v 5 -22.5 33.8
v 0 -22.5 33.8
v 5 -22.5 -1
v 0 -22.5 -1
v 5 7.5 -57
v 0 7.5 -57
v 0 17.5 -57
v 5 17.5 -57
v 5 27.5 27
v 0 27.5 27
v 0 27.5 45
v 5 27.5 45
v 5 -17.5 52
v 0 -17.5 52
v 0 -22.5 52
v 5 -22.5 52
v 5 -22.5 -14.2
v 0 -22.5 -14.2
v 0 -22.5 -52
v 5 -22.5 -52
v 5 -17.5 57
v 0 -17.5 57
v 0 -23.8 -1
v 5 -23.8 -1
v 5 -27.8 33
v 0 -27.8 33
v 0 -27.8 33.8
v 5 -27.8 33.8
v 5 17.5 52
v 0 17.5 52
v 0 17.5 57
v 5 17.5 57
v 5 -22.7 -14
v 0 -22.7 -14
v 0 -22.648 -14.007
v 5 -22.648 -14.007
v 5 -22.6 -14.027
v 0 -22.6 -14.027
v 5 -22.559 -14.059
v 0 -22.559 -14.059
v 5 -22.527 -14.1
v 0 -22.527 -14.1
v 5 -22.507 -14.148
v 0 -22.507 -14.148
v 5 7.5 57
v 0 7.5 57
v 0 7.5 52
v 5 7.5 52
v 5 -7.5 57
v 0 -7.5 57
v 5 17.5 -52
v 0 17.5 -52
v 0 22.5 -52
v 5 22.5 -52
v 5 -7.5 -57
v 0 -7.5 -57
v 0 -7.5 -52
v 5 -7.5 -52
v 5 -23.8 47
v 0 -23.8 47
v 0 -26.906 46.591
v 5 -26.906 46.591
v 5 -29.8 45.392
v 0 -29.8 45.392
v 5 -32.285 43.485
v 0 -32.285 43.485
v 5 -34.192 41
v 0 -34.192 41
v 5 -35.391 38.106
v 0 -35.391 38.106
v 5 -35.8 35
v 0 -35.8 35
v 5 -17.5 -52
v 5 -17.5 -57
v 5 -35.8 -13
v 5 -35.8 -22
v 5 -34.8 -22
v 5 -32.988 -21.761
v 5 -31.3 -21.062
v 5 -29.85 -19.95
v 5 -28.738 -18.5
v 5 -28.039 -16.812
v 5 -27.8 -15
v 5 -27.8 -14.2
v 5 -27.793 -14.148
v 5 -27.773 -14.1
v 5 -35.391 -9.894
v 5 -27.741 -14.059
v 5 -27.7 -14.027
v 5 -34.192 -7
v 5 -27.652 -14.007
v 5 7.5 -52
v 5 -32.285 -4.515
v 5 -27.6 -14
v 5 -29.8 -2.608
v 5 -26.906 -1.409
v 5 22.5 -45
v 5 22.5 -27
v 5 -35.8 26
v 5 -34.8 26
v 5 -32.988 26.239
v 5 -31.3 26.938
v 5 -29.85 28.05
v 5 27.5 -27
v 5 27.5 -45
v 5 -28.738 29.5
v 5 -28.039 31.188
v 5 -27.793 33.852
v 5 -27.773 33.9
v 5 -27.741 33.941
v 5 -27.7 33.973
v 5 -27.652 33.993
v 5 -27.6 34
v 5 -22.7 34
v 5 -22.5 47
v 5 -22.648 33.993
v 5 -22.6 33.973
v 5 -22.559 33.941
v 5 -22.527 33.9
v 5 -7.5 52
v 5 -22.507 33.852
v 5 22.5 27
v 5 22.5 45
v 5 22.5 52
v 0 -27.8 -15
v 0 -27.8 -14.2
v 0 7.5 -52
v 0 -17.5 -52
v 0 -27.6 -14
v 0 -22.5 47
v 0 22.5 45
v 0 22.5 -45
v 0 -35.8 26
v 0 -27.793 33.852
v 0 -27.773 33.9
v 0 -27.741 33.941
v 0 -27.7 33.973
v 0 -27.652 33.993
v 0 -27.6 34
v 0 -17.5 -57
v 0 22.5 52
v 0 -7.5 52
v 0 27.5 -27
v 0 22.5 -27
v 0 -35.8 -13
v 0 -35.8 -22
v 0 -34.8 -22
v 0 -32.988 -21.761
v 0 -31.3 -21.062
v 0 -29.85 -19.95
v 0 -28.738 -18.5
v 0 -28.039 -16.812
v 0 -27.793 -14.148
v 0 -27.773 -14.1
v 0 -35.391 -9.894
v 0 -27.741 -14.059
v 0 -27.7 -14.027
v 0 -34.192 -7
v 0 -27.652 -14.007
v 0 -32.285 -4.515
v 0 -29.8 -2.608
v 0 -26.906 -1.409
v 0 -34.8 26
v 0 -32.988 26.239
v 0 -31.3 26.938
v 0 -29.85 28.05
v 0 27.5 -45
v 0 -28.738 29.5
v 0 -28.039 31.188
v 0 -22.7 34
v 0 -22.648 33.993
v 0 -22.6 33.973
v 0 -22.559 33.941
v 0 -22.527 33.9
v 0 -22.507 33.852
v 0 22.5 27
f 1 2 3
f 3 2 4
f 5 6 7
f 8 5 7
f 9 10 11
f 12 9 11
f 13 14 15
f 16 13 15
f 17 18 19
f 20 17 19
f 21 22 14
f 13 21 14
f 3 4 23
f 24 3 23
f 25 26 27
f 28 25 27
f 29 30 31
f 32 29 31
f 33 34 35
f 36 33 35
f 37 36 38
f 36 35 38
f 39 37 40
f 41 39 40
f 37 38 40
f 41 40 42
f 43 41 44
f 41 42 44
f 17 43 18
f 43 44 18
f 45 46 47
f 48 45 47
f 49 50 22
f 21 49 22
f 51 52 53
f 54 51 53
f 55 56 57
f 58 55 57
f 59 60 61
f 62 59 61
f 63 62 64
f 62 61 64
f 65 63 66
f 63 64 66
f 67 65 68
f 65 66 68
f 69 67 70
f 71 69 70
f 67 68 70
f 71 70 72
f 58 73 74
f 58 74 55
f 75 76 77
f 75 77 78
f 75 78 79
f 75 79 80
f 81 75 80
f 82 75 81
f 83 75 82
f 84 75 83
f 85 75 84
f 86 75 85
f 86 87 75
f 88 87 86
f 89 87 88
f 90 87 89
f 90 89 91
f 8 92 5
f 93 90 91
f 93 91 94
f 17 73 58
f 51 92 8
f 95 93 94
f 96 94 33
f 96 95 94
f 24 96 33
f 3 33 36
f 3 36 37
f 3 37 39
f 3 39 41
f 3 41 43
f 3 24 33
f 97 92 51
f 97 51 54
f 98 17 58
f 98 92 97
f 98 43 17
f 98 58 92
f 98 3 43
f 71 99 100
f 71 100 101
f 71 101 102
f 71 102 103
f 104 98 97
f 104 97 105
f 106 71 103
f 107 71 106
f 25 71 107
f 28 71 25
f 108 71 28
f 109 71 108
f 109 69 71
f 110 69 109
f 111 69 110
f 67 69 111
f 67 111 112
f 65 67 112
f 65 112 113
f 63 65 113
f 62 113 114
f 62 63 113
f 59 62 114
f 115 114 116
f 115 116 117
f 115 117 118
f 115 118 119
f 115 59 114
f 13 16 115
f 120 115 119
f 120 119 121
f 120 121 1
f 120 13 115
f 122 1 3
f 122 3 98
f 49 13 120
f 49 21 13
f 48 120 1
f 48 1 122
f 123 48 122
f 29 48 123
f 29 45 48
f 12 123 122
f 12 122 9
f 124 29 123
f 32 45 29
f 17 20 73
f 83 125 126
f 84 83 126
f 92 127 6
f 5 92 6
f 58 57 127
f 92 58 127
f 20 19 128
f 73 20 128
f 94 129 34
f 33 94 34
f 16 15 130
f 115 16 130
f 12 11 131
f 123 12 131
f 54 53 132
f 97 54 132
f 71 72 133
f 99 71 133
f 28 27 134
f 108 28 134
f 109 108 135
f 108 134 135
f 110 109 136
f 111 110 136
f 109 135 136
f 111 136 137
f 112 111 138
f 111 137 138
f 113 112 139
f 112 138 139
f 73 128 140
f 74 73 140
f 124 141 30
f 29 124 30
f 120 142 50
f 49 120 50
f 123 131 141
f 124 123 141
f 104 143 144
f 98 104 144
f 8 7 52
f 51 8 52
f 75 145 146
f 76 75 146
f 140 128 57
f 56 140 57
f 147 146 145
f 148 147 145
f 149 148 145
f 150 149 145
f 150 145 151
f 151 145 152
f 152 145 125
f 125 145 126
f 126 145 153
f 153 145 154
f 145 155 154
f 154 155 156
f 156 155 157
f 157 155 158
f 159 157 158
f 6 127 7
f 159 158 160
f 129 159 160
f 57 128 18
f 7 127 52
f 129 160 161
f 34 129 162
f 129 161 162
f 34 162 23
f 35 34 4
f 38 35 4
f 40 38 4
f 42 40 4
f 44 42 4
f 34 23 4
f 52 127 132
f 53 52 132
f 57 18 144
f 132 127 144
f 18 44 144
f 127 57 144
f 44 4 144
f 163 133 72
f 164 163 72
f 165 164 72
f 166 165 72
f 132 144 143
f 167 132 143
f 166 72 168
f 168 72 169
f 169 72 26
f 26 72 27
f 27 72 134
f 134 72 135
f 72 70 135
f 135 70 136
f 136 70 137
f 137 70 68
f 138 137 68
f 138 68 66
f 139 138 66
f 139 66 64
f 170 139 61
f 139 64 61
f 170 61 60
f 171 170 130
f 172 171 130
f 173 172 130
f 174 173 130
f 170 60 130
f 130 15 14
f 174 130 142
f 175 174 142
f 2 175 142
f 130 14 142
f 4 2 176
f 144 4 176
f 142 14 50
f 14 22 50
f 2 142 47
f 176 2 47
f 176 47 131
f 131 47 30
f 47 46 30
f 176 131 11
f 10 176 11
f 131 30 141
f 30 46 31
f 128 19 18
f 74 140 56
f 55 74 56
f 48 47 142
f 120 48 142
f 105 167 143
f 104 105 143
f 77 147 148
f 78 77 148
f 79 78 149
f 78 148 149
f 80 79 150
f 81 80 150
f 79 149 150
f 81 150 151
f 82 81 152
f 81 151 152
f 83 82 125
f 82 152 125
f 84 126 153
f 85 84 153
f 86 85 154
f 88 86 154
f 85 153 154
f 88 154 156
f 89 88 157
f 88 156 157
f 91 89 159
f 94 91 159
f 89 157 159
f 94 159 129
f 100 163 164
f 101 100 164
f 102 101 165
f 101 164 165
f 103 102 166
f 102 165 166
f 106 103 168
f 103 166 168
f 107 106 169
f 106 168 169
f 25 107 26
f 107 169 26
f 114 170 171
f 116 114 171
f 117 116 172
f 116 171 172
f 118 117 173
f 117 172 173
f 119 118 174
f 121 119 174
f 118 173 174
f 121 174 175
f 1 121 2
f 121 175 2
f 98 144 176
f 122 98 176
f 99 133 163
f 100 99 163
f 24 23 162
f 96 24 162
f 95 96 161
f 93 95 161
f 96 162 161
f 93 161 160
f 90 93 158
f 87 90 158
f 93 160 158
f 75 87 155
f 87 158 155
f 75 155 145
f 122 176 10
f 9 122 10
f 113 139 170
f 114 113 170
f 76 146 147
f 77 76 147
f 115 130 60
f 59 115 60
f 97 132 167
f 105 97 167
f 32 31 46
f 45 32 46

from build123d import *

# Parameters (mm, degrees)
F1_DEPTH = 5


with BuildPart() as f1:
    # F0 (on Right) → F1 (new body)
    with BuildSketch(Plane.YZ):
        with BuildLine():
            Line((-17.5, 52), (-22.5, 52))
            Line((-22.5, 52), (-22.5, 47))
            Line((-22.5, 47), (-23.8, 47))
            ThreePointArc((-23.8, 47), (-32.285281, 43.485281), (-35.8, 35))
            Line((-35.8, 35), (-35.8, 26))
            Line((-35.8, 26), (-34.8, 26))
            ThreePointArc((-34.8, 26), (-29.850253, 28.050253), (-27.8, 33))
            Line((-27.8, 33), (-27.8, 33.8))
            ThreePointArc((-27.8, 33.8), (-27.741421, 33.941421), (-27.6, 34))
            Line((-27.6, 34), (-22.7, 34))
            ThreePointArc((-22.7, 34), (-22.558579, 33.941421), (-22.5, 33.8))
            Line((-22.5, 33.8), (-22.5, -1))
            Line((-22.5, -1), (-23.8, -1))
            ThreePointArc((-23.8, -1), (-32.285281, -4.514719), (-35.8, -13))
            Line((-35.8, -13), (-35.8, -22))
            Line((-35.8, -22), (-34.8, -22))
            ThreePointArc((-34.8, -22), (-29.850253, -19.949747), (-27.8, -15))
            Line((-27.8, -15), (-27.8, -14.2))
            ThreePointArc((-27.8, -14.2), (-27.741421, -14.058579), (-27.6, -14))
            Line((-27.6, -14), (-22.7, -14))
            ThreePointArc((-22.7, -14), (-22.558579, -14.058579), (-22.5, -14.2))
            Line((-22.5, -14.2), (-22.5, -52))
            Line((-22.5, -52), (-17.5, -52))
            Line((-17.5, -52), (-17.5, -57))
            Line((-17.5, -57), (-7.5, -57))
            Line((-7.5, -57), (-7.5, -52))
            Line((-7.5, -52), (7.5, -52))
            Line((7.5, -52), (7.5, -57))
            Line((7.5, -57), (17.5, -57))
            Line((17.5, -57), (17.5, -52))
            Line((17.5, -52), (22.5, -52))
            Line((22.5, -52), (22.5, -45))
            Line((22.5, -45), (27.5, -45))
            Line((27.5, -45), (27.5, -27))
            Line((27.5, -27), (22.5, -27))
            Line((22.5, -27), (22.5, 27))
            Line((22.5, 27), (27.5, 27))
            Line((27.5, 27), (27.5, 45))
            Line((27.5, 45), (22.5, 45))
            Line((22.5, 45), (22.5, 52))
            Line((22.5, 52), (17.5, 52))
            Line((17.5, 52), (17.5, 57))
            Line((17.5, 57), (7.5, 57))
            Line((7.5, 57), (7.5, 52))
            Line((7.5, 52), (-7.5, 52))
            Line((-7.5, 52), (-7.5, 57))
            Line((-7.5, 57), (-17.5, 57))
            Line((-17.5, 57), (-17.5, 52))
        make_face()
    extrude(amount=F1_DEPTH)


solid = f1.part
